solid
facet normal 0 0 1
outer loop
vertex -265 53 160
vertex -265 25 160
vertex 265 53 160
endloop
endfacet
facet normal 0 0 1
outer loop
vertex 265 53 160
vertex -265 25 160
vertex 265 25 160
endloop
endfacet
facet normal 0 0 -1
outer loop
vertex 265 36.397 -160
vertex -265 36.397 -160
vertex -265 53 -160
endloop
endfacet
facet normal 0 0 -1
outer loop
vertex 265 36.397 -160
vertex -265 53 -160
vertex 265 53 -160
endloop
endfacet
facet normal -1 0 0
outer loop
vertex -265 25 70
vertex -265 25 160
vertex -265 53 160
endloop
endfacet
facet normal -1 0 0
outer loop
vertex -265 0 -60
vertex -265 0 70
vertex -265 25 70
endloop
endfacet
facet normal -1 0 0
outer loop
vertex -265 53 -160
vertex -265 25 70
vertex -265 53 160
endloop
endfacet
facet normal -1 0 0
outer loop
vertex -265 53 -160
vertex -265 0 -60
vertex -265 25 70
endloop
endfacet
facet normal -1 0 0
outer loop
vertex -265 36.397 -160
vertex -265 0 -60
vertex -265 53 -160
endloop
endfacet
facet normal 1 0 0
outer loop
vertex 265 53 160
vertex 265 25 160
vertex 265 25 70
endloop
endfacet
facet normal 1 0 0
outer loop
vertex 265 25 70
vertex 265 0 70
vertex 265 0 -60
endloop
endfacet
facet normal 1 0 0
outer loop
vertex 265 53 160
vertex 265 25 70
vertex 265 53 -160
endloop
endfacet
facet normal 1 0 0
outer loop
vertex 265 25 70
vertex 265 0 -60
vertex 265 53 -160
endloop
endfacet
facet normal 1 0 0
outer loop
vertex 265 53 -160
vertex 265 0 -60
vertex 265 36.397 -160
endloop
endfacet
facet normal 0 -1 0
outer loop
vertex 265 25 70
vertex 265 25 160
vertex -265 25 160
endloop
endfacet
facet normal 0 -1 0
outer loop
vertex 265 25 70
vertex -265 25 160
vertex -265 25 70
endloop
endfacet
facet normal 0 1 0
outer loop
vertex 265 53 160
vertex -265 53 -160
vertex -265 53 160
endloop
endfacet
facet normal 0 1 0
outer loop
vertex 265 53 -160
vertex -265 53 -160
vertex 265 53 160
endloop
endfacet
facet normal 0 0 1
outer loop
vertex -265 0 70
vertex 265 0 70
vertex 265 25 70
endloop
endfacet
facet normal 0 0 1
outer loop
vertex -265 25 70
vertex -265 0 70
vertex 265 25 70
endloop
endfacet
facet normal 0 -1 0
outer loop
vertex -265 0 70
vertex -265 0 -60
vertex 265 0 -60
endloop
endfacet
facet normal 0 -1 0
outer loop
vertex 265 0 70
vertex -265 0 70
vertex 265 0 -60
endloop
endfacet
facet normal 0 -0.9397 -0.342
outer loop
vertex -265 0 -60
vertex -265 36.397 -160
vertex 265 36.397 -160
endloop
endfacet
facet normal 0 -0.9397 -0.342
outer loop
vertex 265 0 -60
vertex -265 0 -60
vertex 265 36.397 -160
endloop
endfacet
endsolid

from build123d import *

# Parameters (mm, degrees)
SKIZZE1_W                       = 530
SKIZZE1_H                       = 320
AUFSATZ_LINEAR_AUSTRAGEN1_DEPTH = 53
FASE1_SIZE                      = 100
FASE1_SIZE2                     = 36.397023427
SKIZZE2_W                       = 90
SKIZZE2_H                       = 25
SCHNITT_LINEAR_AUSTRAGEN1_DEPTH = 530


with BuildPart() as part:
    # Skizze1 → Aufsatz-Linear austragen1 (new body)
    with BuildSketch(Plane(origin=(0, 0, 0), x_dir=(1, 0, 0), z_dir=(0, 1, 0))):
        Rectangle(SKIZZE1_W, SKIZZE1_H)
    extrude(amount=AUFSATZ_LINEAR_AUSTRAGEN1_DEPTH)

    # Fase1
    fase1_edges = [part.edges().sort_by_distance(p)[0] for p in [
        (0, 0, -160),
    ]]
    fase1_side = [part.faces().sort_by_distance(p)[0] for p in [
        (0, 0, 0),
    ]]
    chamfer(fase1_edges, length=FASE1_SIZE, length2=FASE1_SIZE2, reference=fase1_side[0])

    # Skizze2 → Schnitt-Linear austragen1 (cut)
    with BuildSketch(Plane(origin=(265, 0, 0), x_dir=(0, 0, -1), z_dir=(1, 0, 0))):
        with Locations((-115, 12.5)):
            Rectangle(SKIZZE2_W, SKIZZE2_H)
    extrude(amount=-SCHNITT_LINEAR_AUSTRAGEN1_DEPTH, mode=Mode.SUBTRACT)


solid = part.part
